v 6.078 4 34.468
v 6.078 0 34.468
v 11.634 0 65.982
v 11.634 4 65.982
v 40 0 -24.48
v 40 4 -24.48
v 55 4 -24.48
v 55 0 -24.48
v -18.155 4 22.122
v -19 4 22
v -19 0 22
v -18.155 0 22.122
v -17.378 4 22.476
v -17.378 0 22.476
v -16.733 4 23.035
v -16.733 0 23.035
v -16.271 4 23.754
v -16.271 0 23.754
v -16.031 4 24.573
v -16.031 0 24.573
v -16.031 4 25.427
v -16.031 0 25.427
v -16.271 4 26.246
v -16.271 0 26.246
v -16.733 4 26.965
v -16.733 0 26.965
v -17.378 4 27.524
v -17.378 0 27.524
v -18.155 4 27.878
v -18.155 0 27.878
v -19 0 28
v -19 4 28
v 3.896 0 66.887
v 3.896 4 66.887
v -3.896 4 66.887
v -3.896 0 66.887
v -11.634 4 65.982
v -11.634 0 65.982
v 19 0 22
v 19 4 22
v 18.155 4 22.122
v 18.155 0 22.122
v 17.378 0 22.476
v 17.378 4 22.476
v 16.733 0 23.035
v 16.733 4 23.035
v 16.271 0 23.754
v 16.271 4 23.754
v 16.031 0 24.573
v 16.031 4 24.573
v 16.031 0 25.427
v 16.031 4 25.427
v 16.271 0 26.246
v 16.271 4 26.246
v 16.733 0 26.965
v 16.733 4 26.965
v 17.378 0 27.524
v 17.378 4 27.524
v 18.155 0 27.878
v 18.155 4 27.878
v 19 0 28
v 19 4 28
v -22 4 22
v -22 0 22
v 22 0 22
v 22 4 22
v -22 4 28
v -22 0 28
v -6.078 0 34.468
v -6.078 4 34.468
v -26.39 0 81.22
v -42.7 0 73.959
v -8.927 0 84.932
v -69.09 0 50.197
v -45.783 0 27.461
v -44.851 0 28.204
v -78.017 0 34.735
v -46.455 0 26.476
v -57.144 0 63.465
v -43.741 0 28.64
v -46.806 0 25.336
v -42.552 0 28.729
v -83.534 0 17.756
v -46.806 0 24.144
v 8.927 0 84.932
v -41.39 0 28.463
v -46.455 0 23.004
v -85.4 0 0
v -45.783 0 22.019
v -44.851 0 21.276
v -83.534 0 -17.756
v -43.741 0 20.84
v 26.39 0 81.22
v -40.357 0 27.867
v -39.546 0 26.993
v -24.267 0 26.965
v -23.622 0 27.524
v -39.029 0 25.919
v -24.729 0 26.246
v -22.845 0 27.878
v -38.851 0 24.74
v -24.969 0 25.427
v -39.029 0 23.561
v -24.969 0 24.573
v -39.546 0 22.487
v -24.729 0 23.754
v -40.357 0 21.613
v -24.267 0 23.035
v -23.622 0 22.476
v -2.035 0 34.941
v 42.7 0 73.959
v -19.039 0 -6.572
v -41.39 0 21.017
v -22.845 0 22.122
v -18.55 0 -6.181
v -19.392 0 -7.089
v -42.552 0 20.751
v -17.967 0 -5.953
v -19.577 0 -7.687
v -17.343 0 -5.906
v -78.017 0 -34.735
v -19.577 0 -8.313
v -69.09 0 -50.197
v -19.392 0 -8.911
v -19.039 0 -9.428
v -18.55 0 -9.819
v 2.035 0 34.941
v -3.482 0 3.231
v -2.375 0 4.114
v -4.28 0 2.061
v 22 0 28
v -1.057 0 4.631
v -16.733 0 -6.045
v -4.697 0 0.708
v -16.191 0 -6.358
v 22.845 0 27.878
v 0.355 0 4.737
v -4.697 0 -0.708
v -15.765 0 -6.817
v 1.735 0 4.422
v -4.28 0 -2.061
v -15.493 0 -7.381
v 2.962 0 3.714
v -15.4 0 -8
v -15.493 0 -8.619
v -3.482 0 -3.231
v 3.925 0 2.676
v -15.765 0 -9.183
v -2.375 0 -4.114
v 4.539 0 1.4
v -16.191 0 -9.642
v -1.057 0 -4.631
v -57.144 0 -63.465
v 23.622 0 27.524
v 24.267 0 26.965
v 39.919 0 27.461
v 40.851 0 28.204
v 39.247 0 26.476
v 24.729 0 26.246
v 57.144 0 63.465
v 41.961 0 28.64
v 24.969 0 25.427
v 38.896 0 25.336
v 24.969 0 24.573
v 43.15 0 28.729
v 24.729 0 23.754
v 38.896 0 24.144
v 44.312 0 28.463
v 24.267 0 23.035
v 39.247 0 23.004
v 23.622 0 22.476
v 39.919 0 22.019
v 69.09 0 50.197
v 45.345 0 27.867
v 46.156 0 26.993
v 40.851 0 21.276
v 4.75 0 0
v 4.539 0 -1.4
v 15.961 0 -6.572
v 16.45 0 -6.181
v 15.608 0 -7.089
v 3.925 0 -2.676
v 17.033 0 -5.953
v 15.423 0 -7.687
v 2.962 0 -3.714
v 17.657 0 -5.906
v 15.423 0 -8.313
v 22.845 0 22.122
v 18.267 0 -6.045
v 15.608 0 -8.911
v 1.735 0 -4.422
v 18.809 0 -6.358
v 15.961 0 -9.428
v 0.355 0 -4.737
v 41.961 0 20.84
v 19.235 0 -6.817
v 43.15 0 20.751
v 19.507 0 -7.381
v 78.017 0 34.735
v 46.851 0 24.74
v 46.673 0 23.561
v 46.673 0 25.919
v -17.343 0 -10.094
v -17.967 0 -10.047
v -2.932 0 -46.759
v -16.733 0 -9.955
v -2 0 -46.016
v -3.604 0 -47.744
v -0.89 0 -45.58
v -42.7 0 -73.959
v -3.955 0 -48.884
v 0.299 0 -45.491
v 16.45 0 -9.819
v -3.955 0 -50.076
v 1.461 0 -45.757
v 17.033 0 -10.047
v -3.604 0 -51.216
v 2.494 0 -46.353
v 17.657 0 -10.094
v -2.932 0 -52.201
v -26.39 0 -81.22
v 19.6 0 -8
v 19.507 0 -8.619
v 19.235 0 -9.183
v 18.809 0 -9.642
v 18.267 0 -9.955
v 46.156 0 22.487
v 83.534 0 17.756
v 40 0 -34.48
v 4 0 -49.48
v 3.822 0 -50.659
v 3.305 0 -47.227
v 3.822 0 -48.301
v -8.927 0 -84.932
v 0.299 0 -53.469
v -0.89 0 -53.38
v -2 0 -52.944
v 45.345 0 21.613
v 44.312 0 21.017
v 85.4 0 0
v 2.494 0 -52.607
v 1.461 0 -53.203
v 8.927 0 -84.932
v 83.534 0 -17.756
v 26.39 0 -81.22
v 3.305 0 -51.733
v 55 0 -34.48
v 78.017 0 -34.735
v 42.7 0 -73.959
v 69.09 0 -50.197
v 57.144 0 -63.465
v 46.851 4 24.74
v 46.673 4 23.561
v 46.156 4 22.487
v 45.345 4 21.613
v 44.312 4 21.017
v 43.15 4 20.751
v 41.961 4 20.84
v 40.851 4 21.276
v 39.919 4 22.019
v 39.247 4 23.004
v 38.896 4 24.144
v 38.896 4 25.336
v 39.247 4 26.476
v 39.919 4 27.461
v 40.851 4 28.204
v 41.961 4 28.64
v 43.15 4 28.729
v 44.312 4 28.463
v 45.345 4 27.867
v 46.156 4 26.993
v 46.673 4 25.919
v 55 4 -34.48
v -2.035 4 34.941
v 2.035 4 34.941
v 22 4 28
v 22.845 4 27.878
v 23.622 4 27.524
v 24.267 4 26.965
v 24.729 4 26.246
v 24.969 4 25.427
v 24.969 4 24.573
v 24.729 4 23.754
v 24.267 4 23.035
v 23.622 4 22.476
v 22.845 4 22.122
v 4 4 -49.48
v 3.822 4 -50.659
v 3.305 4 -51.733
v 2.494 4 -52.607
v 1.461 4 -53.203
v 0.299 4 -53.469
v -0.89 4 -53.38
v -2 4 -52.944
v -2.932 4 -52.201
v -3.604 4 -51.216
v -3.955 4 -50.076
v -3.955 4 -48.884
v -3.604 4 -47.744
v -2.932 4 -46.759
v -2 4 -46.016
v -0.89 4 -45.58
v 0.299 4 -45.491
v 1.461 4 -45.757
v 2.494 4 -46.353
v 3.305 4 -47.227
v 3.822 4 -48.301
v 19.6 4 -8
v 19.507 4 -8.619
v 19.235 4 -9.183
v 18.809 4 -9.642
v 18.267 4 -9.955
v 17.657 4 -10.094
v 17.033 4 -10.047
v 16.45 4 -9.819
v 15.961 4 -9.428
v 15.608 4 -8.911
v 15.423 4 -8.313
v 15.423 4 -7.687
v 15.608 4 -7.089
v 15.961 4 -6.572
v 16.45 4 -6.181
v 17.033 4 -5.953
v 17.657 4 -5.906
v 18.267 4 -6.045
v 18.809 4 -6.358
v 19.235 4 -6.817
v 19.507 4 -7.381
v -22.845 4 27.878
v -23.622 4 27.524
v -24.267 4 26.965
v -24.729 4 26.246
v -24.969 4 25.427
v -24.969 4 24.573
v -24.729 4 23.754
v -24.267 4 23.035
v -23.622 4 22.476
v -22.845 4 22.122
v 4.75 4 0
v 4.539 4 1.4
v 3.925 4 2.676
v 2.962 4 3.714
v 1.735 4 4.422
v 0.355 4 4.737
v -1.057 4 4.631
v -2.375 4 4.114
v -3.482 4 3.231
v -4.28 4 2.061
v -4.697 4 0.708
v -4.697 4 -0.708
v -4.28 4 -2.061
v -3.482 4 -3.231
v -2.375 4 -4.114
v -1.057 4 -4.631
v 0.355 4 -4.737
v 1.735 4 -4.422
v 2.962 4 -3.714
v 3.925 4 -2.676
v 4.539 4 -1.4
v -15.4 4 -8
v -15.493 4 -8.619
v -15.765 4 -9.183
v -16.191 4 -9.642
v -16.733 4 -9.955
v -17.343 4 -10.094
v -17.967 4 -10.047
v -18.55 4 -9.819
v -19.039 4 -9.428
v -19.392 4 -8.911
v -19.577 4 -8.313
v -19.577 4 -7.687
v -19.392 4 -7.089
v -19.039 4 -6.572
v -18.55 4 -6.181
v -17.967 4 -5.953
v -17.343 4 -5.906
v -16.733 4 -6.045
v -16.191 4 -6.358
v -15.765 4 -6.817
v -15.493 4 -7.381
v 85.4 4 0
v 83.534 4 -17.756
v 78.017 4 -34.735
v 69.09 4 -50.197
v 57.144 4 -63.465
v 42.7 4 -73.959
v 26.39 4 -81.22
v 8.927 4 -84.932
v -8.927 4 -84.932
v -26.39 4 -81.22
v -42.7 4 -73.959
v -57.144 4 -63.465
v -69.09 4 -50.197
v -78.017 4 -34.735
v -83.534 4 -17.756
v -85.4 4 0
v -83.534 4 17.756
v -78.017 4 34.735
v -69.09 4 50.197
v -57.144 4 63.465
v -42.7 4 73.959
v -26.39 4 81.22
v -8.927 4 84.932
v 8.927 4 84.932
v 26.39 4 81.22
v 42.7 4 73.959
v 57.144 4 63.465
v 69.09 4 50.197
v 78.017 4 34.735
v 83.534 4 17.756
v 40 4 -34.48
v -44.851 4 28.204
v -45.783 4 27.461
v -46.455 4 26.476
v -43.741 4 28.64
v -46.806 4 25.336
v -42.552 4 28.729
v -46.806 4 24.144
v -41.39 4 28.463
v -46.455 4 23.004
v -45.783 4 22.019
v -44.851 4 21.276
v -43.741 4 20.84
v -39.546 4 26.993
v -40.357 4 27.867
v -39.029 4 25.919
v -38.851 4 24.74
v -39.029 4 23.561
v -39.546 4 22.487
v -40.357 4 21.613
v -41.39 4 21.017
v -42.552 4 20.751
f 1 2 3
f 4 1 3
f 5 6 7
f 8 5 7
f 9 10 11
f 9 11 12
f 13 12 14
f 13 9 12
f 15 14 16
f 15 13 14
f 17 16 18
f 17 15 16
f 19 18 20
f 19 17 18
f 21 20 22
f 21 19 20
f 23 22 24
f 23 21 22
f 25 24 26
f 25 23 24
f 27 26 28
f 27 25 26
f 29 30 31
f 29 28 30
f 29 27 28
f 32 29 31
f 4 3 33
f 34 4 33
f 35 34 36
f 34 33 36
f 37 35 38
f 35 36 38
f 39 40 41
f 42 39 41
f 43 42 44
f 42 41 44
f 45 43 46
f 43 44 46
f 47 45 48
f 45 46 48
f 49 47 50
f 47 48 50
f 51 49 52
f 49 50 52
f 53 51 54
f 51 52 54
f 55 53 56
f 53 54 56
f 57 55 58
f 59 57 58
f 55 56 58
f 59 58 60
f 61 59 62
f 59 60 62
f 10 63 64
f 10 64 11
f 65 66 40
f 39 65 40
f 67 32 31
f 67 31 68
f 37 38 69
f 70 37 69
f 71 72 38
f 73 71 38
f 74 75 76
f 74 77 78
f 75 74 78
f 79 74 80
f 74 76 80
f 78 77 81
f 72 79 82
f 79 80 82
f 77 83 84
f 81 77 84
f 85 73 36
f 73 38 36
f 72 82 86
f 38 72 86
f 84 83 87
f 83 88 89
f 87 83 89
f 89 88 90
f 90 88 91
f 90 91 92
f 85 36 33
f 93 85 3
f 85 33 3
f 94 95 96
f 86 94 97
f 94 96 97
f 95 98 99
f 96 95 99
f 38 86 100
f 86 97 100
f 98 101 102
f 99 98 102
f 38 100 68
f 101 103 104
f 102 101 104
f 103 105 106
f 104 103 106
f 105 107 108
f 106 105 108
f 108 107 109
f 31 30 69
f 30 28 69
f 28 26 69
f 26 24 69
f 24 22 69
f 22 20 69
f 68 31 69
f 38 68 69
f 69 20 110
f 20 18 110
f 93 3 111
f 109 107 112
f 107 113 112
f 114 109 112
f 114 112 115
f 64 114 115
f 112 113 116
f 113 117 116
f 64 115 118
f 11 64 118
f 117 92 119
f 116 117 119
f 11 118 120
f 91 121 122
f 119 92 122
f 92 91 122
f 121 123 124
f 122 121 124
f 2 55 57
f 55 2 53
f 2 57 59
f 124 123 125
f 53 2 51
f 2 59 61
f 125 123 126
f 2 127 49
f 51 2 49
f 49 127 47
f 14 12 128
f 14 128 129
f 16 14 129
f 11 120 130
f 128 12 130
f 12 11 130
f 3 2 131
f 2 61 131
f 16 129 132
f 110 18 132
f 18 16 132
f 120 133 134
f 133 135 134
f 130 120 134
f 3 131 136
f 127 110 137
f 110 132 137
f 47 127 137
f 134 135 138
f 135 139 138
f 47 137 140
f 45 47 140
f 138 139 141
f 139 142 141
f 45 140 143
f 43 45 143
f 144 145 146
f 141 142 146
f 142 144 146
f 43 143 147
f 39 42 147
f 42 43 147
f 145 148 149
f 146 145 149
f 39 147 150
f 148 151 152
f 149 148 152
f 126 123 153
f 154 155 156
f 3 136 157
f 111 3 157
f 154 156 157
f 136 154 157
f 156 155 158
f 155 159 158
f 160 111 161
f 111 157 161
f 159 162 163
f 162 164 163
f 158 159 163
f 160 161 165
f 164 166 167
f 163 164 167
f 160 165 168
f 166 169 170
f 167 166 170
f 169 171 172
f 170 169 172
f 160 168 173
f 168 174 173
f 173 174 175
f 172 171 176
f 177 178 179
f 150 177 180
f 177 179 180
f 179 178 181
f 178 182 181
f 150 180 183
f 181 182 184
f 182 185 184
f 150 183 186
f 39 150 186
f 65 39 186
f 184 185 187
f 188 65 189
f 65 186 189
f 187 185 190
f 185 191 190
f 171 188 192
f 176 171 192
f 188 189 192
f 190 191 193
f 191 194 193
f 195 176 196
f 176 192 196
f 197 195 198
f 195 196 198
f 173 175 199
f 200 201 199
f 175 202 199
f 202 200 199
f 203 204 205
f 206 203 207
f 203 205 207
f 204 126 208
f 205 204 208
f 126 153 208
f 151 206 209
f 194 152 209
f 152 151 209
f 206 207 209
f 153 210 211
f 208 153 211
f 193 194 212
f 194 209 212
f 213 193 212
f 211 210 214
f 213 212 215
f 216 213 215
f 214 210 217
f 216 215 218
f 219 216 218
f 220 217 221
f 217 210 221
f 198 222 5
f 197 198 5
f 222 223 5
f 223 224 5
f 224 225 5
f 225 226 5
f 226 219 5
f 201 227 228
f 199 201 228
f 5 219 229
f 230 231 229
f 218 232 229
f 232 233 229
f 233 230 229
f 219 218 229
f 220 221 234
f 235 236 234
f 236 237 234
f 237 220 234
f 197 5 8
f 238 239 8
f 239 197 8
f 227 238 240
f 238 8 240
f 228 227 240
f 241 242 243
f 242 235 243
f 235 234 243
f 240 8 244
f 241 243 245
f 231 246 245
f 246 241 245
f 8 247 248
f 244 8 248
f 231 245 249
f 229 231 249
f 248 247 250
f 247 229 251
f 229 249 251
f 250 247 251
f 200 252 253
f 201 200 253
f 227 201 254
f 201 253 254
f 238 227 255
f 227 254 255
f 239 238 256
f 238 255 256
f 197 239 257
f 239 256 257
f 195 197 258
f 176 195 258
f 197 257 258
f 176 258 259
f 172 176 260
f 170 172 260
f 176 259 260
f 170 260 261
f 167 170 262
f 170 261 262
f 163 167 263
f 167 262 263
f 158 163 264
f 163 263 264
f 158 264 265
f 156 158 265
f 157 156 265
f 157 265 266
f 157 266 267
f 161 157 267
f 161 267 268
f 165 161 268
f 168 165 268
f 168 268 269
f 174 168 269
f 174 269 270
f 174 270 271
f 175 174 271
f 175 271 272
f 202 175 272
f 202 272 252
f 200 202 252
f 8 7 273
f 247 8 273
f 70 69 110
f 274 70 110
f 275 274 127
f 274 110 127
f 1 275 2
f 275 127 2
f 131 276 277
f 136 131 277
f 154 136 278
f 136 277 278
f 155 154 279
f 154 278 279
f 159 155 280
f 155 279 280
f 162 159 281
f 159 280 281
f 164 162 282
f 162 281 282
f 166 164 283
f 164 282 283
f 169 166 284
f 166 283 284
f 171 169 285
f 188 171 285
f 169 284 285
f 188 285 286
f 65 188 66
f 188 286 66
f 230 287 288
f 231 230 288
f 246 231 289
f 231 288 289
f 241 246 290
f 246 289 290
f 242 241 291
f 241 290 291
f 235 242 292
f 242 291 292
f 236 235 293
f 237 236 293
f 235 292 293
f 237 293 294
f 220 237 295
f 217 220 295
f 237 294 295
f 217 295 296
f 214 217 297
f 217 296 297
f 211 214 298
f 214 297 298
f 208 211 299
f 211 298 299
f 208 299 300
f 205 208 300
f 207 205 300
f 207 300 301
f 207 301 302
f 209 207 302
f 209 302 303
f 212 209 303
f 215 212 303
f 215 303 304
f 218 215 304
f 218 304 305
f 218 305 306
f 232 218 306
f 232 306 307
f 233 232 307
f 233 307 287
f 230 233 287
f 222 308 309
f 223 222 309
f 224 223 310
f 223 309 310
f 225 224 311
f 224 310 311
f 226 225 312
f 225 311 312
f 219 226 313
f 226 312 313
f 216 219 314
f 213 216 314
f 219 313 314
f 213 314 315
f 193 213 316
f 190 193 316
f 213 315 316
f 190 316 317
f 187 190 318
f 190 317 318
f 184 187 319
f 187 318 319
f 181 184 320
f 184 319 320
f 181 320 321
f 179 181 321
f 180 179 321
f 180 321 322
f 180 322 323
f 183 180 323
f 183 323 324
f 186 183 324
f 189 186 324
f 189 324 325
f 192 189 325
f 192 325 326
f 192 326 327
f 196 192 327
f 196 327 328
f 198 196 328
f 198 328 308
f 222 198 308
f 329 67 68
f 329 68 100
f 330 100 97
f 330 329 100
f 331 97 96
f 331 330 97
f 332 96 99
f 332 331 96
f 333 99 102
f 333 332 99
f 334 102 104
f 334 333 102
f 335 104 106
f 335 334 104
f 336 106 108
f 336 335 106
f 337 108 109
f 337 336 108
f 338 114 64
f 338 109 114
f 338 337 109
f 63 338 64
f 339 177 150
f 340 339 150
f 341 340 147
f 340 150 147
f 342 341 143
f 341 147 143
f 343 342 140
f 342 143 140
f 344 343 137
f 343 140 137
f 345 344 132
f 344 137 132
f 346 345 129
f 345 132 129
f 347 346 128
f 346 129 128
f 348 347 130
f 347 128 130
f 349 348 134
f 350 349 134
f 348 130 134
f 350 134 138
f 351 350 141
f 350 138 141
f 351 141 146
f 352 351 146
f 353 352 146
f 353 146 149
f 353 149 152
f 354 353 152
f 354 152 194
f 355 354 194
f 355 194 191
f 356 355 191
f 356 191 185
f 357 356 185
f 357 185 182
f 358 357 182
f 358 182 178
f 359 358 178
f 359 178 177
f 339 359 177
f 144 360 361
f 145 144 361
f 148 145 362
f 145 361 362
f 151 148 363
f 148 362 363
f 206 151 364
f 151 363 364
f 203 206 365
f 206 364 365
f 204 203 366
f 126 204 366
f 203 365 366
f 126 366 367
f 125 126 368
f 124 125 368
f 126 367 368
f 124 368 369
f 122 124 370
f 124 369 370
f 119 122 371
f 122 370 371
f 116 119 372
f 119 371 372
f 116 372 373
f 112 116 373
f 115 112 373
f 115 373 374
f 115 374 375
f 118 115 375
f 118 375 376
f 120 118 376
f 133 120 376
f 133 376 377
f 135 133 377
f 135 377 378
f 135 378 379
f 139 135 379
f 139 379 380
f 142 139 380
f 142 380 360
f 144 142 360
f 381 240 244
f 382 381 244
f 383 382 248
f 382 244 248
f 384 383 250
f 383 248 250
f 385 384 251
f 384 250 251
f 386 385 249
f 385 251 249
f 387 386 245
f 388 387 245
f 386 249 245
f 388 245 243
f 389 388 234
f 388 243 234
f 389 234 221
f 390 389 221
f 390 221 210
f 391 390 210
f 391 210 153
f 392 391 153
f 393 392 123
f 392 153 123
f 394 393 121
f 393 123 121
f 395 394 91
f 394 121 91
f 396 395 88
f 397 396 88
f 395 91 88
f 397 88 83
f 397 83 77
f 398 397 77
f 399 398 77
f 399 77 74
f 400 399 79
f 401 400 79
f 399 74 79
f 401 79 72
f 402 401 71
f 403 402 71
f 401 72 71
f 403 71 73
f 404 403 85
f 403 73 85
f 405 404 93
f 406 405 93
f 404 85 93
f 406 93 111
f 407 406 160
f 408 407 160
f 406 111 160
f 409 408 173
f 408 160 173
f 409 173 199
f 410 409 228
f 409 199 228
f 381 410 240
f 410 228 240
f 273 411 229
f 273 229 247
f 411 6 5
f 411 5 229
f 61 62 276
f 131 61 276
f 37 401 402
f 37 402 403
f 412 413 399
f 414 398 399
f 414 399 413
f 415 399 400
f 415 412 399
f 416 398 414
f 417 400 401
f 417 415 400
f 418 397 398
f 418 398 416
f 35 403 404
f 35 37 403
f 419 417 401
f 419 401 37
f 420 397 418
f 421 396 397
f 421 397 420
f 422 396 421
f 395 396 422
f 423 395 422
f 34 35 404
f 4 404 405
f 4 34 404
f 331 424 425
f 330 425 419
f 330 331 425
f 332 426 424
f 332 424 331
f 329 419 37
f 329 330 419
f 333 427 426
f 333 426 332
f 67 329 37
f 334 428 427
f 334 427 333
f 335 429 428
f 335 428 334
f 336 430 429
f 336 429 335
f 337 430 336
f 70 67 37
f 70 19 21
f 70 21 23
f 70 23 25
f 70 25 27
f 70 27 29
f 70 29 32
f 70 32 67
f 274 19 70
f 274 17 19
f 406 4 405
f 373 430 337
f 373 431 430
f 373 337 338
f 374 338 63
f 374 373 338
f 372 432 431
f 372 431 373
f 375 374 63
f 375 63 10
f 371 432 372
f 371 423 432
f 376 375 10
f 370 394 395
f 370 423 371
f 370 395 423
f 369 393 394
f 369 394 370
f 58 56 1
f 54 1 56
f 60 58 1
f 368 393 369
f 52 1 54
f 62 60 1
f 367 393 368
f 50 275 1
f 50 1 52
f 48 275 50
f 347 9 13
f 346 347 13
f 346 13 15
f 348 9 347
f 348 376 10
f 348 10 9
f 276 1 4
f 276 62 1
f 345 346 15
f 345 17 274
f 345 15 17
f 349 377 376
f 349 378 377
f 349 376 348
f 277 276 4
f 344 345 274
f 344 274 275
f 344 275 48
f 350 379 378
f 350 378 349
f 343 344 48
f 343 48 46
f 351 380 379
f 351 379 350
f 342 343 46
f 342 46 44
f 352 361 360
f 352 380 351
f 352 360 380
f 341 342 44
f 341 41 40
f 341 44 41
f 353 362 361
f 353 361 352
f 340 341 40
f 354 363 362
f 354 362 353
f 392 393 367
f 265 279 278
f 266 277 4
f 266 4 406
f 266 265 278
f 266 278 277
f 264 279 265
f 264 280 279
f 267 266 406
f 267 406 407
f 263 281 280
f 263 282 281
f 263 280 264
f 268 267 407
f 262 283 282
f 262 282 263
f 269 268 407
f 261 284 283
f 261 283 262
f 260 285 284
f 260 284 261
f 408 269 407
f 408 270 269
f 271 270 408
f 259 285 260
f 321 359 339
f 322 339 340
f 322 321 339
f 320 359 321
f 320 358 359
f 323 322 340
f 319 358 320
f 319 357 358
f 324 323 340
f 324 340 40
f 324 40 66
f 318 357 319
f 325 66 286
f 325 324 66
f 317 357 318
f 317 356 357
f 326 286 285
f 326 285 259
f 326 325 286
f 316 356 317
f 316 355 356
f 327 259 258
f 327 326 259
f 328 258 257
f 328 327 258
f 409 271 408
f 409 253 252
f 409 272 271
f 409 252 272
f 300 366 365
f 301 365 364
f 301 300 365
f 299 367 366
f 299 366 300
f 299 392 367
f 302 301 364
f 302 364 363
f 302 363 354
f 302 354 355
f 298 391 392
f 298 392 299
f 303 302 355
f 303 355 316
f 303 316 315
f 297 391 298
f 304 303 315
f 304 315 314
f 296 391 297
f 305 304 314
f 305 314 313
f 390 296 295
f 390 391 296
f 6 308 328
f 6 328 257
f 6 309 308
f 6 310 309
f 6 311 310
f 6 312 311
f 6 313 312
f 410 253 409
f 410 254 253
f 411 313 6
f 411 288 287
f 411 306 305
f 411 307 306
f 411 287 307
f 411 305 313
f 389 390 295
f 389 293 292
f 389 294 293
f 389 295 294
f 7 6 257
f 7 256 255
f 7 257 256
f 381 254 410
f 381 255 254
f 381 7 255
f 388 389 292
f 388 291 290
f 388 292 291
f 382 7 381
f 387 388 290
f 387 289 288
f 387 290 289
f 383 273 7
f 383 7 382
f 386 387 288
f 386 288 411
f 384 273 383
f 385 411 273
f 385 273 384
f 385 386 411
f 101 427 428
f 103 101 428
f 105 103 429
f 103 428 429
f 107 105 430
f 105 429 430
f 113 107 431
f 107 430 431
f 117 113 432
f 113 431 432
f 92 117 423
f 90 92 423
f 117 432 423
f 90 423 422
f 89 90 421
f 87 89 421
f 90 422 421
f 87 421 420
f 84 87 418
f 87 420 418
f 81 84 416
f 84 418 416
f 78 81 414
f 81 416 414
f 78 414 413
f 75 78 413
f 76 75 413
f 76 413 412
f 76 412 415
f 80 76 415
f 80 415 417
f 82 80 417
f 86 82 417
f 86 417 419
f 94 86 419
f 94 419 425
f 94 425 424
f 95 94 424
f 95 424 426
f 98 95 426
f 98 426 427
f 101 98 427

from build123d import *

# Parameters (mm, degrees)
ESBO_O1_R                = 85.4
RESSALTO_EXTRUS_O1_DEPTH = 4
CORTE_EXTRUS_O2_DEPTH    = 5
ESBO_O4_R                = 4
CORTE_EXTRUS_O3_DEPTH    = 5
ESBO_O5_R                = 4.75
CORTE_EXTRUS_O4_DEPTH    = 5
ESBO_O7_R                = 2.1
CORTE_EXTRUS_O5_DEPTH    = 5
CORTE_EXTRUS_O6_REACH    = 6
ESBO_O8_W                = 15
ESBO_O8_H                = 10


with BuildPart() as part:
    # Esboço1 → Ressalto-extrusão1 (new body)
    with BuildSketch(Plane(origin=(0, 0, 0), x_dir=(1, 0, 0), z_dir=(0, 1, 0))):
        Circle(ESBO_O1_R)
    extrude(amount=RESSALTO_EXTRUS_O1_DEPTH)

    # Esboço3 → Corte-extrusão2 (cut, through all)
    with BuildSketch(Plane.XZ):
        with BuildLine():
            Line((6.077686218, 34.468271355), (11.634427904, 65.982119452))
            ThreePointArc((11.634427904, 65.982119452), (0, 67), (-11.634427904, 65.982119452))
            Line((-11.634427904, 65.982119452), (-6.077686218, 34.468271355))
            ThreePointArc((-6.077686218, 34.468271355), (0, 35), (6.077686218, 34.468271355))
        make_face()
    extrude(amount=-CORTE_EXTRUS_O2_DEPTH, mode=Mode.SUBTRACT)

    # Esboço4 → Corte-extrusão3 (cut, through all)
    with BuildSketch(Plane(origin=(0, 4, 0), x_dir=(1, 0, 0), z_dir=(0, 1, 0))):
        with Locations((42.850936979, -24.74)):
            Circle(ESBO_O4_R)
        with Locations((0, 49.48)):
            Circle(ESBO_O4_R)
        with Locations((-42.850936979, -24.74)):
            Circle(ESBO_O4_R)
    extrude(amount=-CORTE_EXTRUS_O3_DEPTH, mode=Mode.SUBTRACT)

    # Esboço5 → Corte-extrusão4 (cut, through all)
    with BuildSketch(Plane.XZ):
        Circle(ESBO_O5_R)
    extrude(amount=-CORTE_EXTRUS_O4_DEPTH, mode=Mode.SUBTRACT)

    # Esboço7 → Corte-extrusão5 (cut, through all)
    with BuildSketch(Plane(origin=(0, 4, 0), x_dir=(1, 0, 0), z_dir=(0, 1, 0))):
        with Locations((-17.5, 8)):
            Circle(ESBO_O7_R)
        with Locations((17.5, 8)):
            Circle(ESBO_O7_R)
        with BuildLine():
            Line((-22, -22), (-19, -22))
            ThreePointArc((-19, -22), (-16, -25), (-19, -28))
            Line((-19, -28), (-22, -28))
            ThreePointArc((-22, -28), (-25, -25), (-22, -22))
        make_face()
        with BuildLine():
            Line((19, -28), (22, -28))
            ThreePointArc((22, -28), (25, -25), (22, -22))
            Line((22, -22), (19, -22))
            ThreePointArc((19, -22), (16, -25), (19, -28))
        make_face()
    extrude(amount=-CORTE_EXTRUS_O5_DEPTH, mode=Mode.SUBTRACT)

    # Esboço8 → Corte-extrusão6 (cut, up to next)
    with BuildSketch(Plane(origin=(0, 4, 0), x_dir=(1, 0, 0), z_dir=(0, 1, 0)), mode=Mode.PRIVATE) as corte_extrus_o6_sk1:
        with Locations((47.5, 29.48)):
            Rectangle(ESBO_O8_W, ESBO_O8_H)
    corte_extrus_o6_tool1 = extrude(corte_extrus_o6_sk1.sketch, amount=-CORTE_EXTRUS_O6_REACH, mode=Mode.PRIVATE) & part.part
    add(corte_extrus_o6_tool1.solids().sort_by_distance((47.5, 4, -29.48))[0], mode=Mode.SUBTRACT)


solid = part.part
